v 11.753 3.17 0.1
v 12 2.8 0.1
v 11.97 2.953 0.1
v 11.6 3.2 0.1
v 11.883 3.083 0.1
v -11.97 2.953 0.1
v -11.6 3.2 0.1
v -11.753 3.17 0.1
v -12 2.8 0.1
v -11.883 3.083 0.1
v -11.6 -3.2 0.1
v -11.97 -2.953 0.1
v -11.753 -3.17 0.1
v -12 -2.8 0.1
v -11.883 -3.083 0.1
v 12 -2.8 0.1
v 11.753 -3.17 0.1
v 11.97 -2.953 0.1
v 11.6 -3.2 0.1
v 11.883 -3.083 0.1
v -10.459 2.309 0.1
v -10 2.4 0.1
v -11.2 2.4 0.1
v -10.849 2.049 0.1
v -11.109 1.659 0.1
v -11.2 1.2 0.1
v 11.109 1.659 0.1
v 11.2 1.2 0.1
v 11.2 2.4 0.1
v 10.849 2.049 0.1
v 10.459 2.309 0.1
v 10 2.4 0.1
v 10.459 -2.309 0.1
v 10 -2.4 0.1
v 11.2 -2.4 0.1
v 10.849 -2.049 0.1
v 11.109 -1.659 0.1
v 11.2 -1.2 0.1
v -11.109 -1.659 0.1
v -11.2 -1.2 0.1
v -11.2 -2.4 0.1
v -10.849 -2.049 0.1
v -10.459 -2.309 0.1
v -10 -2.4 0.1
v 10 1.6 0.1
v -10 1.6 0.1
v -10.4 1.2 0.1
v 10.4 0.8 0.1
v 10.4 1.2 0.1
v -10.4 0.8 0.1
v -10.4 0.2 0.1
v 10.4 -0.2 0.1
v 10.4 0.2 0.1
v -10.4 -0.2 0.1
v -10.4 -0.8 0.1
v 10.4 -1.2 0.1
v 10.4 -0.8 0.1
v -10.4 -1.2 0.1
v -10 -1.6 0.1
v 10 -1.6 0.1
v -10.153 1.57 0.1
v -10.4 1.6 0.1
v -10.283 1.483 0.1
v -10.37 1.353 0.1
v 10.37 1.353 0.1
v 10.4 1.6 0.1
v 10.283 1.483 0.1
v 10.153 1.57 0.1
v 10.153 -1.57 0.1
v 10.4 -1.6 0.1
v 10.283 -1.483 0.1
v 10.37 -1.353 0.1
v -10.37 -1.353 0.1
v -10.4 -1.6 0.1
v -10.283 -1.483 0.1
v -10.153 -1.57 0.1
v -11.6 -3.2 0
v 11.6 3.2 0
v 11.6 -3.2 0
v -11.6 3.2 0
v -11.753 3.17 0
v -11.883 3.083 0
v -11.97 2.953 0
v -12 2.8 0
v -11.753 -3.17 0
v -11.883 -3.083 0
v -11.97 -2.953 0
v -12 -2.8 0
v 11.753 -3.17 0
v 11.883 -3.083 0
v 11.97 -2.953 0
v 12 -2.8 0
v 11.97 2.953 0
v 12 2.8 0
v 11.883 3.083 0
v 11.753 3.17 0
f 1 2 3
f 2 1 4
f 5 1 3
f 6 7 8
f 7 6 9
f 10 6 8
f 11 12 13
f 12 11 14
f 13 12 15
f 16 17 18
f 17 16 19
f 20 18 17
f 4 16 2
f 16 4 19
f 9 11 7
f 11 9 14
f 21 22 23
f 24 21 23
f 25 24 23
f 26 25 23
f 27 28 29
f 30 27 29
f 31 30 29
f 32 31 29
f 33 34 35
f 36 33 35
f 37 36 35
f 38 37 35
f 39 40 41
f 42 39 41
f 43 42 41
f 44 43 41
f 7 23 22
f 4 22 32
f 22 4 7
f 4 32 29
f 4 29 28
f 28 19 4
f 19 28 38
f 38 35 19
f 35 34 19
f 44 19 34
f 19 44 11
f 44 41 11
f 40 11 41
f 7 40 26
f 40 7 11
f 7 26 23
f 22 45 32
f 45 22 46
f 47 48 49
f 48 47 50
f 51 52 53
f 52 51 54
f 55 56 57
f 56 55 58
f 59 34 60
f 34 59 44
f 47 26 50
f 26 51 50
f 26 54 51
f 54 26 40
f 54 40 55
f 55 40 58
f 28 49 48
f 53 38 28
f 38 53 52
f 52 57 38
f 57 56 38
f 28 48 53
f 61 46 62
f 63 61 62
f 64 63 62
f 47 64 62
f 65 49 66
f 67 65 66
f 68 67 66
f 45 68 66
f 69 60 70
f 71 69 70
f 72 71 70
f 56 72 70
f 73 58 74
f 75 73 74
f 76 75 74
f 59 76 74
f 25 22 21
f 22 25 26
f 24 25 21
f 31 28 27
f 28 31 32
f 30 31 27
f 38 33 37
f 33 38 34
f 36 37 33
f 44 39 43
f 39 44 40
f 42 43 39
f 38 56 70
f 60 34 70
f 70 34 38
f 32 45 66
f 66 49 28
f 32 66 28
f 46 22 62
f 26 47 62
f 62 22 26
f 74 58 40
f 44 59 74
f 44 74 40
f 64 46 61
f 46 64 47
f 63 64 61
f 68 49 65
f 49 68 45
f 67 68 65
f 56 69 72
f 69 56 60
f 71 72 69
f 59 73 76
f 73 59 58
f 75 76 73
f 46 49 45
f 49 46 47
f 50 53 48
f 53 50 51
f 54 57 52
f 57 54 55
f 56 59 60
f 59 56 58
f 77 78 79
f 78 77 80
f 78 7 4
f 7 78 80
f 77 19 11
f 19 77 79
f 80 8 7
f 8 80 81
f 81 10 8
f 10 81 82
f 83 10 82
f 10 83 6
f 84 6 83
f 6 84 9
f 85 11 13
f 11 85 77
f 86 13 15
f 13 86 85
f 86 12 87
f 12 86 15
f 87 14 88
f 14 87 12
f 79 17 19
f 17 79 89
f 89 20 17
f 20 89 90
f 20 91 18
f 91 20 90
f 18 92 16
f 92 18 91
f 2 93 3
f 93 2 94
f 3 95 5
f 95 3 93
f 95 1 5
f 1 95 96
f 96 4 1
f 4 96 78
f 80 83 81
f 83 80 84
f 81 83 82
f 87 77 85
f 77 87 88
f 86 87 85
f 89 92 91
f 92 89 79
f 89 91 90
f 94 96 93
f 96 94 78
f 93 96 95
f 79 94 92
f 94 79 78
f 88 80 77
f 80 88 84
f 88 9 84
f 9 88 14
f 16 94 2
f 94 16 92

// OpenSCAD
// file: ../p/box3u12.scad
use <../lib.scad>
function ldraw_lib__box3u12() = [
// 0 Box with 3 Parallel Faces without Any Edges
// 0 Name: box3u12.dat
// 0 Author: J.C. Tchang [tchang]
// 0 !LDRAW_ORG Primitive UPDATE 2014-02
// 0 !LICENSE Licensed under CC BY 2.0 and CC BY 4.0 : see CAreadme.txt
// 
// 0 BFC CERTIFY CCW
  [0,"BFC","CERTIFY"],
  [0,"BFC","CCW"],
// 
// 0 !HISTORY 2014-12-23 [PTadmin] Official Update 2014-02
// 
// 
// 4 16 -1 1 1 1 1 1 1 1 -1 -1 1 -1
  [4,16,-1,1,1,1,1,1,1,1,-1,-1,1,-1],
// 4 16 -1 1 1 -1 0 1 1 0 1 1 1 1
  [4,16,-1,1,1,-1,0,1,1,0,1,1,1,1],
// 4 16 1 1 -1 1 0 -1 -1 0 -1 -1 1 -1
  [4,16,1,1,-1,1,0,-1,-1,0,-1,-1,1,-1],
];
makepoly(ldraw_lib__box3u12(), line=0.2);
// file: ../p/1-4cyli.scad
use <../lib.scad>
function ldraw_lib__1_4cyli() = [
// 0 Cylinder 0.25
// 0 Name: 1-4cyli.dat
// 0 Author: James Jessiman
// 0 !LDRAW_ORG Primitive UPDATE 2012-01
// 0 !LICENSE Licensed under CC BY 2.0 and CC BY 4.0 : see CAreadme.txt
// 
// 0 BFC CERTIFY CCW
  [0,"BFC","CERTIFY"],
  [0,"BFC","CCW"],
// 
// 0 !HISTORY 2002-03-23 [sbliss] Added BFC statement.
// 0 !HISTORY 2002-04-25 [PTadmin] Official Update 2002-02
// 0 !HISTORY 2007-06-22 [PTadmin] Header formatted for Contributor Agreement
// 0 !HISTORY 2008-07-01 [PTadmin] Official Update 2008-01
// 0 !HISTORY 2012-02-16 [Philo] Changed to CCW
// 0 !HISTORY 2012-03-30 [PTadmin] Official Update 2012-01
// 
// 
// 4 16 1 1 0 0.9239 1 0.3827 0.9239 0 0.3827 1 0 0
  [4,16,1,1,0,0.9239,1,0.3827,0.9239,0,0.3827,1,0,0],
// 5 24 1 0 0 1 1 0 0.9239 0 0.3827 1 0 -1
  [5,24,1,0,0,1,1,0,0.9239,0,0.3827,1,0,-1],
// 4 16 0.9239 1 0.3827 0.7071 1 0.7071 0.7071 0 0.7071 0.9239 0 0.3827
  [4,16,0.9239,1,0.3827,0.7071,1,0.7071,0.7071,0,0.7071,0.9239,0,0.3827],
// 5 24 0.9239 0 0.3827 0.9239 1 0.3827 0.7071 0 0.7071 1 0 0
  [5,24,0.9239,0,0.3827,0.9239,1,0.3827,0.7071,0,0.7071,1,0,0],
// 4 16 0.7071 1 0.7071 0.3827 1 0.9239 0.3827 0 0.9239 0.7071 0 0.7071
  [4,16,0.7071,1,0.7071,0.3827,1,0.9239,0.3827,0,0.9239,0.7071,0,0.7071],
// 5 24 0.7071 0 0.7071 0.7071 1 0.7071 0.3827 0 0.9239 0.9239 0 0.3827
  [5,24,0.7071,0,0.7071,0.7071,1,0.7071,0.3827,0,0.9239,0.9239,0,0.3827],
// 4 16 0.3827 1 0.9239 0 1 1 0 0 1 0.3827 0 0.9239
  [4,16,0.3827,1,0.9239,0,1,1,0,0,1,0.3827,0,0.9239],
// 5 24 0.3827 0 0.9239 0.3827 1 0.9239 0 0 1 0.7071 0 0.7071
  [5,24,0.3827,0,0.9239,0.3827,1,0.9239,0,0,1,0.7071,0,0.7071],
// 5 24 0 0 1 0 1 1 0.3827 0 0.9239 -1 0 1
  [5,24,0,0,1,0,1,1,0.3827,0,0.9239,-1,0,1],
];
makepoly(ldraw_lib__1_4cyli(), line=0.2);
// file: ../p/1-4ndis.scad
use <../lib.scad>
function ldraw_lib__1_4ndis() = [
// 0 Disc Negative 0.25
// 0 Name: 1-4ndis.dat
// 0 Author: James Jessiman
// 0 !LDRAW_ORG Primitive UPDATE 2012-01
// 0 !LICENSE Licensed under CC BY 2.0 and CC BY 4.0 : see CAreadme.txt
// 
// 0 BFC CERTIFY CCW
  [0,"BFC","CERTIFY"],
  [0,"BFC","CCW"],
// 
// 0 !HISTORY 2002-03-23 [sbliss] Added BFC Statement
// 0 !HISTORY 2002-04-25 [PTadmin] Official Update 2002-02
// 0 !HISTORY 2007-06-22 [PTadmin] Header formatted for Contributor Agreement
// 0 !HISTORY 2008-07-01 [PTadmin] Official Update 2008-01
// 0 !HISTORY 2012-02-16 [Philo] Changed to CCW
// 0 !HISTORY 2012-03-30 [PTadmin] Official Update 2012-01
// 
// 
// 3 16 0.9239 0 0.3827 1 0 0 1 0 1
  [3,16,0.9239,0,0.3827,1,0,0,1,0,1],
// 3 16 0.7071 0 0.7071 0.9239 0 0.3827 1 0 1
  [3,16,0.7071,0,0.7071,0.9239,0,0.3827,1,0,1],
// 3 16 0.3827 0 0.9239 0.7071 0 0.7071 1 0 1
  [3,16,0.3827,0,0.9239,0.7071,0,0.7071,1,0,1],
// 3 16 0 0 1 0.3827 0 0.9239 1 0 1
  [3,16,0,0,1,0.3827,0,0.9239,1,0,1],
];
makepoly(ldraw_lib__1_4ndis(), line=0.2);
// file: ../p/1-4chrd.scad
use <../lib.scad>
function ldraw_lib__1_4chrd() = [
// 0 Chord 0.25
// 0 Name: 1-4chrd.dat
// 0 Author: Tony Hafner [hafhead]
// 0 !LDRAW_ORG Primitive UPDATE 2012-02
// 0 !LICENSE Licensed under CC BY 2.0 and CC BY 4.0 : see CAreadme.txt
// 
// 0 BFC CERTIFY CCW
  [0,"BFC","CERTIFY"],
  [0,"BFC","CCW"],
// 
// 0 !HISTORY 2004-04-22 [PTadmin] Official Update 2004-02
// 0 !HISTORY 2007-10-09 [PTadmin] Header formatted for Contributor Agreement
// 0 !HISTORY 2008-07-01 [PTadmin] Official Update 2008-01
// 0 !HISTORY 2012-08-02 [MMR1988] Re-creation with PrimGen2 and Rectifier
// 0 !HISTORY 2012-08-09 [PTadmin] Official Update 2012-02
// 
// 
// 4 16 0.9239 0 0.3827 0.3827 0 0.9239 0 0 1 1 0 0
  [4,16,0.9239,0,0.3827,0.3827,0,0.9239,0,0,1,1,0,0],
// 3 16 0.7071 0 0.7071 0.3827 0 0.9239 0.9239 0 0.3827
  [3,16,0.7071,0,0.7071,0.3827,0,0.9239,0.9239,0,0.3827],
];
makepoly(ldraw_lib__1_4chrd(), line=0.2);
// file: s/4111899hs02.scad
use <../../lib.scad>
use <../../p/1-4chrd.scad>
use <../../p/1-4cyli.scad>
use <../../p/box3u12.scad>
function ldraw_lib__s__4111899hs02() = [
// 0 ~Sticker  0.8 x  3 without Top Surface
// 0 Name: s\4111899hs02.dat
// 0 Author: Ulrich Röder [UR]
// 0 !LDRAW_ORG Subpart UPDATE 2020-03
// 0 !LICENSE Licensed under CC BY 2.0 and CC BY 4.0 : see CAreadme.txt
// 
// 0 BFC CERTIFY CCW
  [0,"BFC","CERTIFY"],
  [0,"BFC","CCW"],
// 
// 0 !HISTORY 2020-12-29 [PTadmin] Official Update 2020-03
// 
// 
// 1 16 0 -0.25 0 29 0 0 0 0.25 0 0 0 8 box3u12.dat
  [1,16,0,-0.25,0,29,0,0,0,0.25,0,0,0,8, ldraw_lib__box3u12()],
// 1 16 -29 0 7 0 0 -1 0 -.25 0 1 0 0 1-4cyli.dat
  [1,16,-29,0,7,0,0,-1,0,-.25,0,1,0,0, ldraw_lib__1_4cyli()],
// 1 16 -29 0 -7 0 0 -1 0 -.25 0 -1 0 0 1-4cyli.dat
  [1,16,-29,0,-7,0,0,-1,0,-.25,0,-1,0,0, ldraw_lib__1_4cyli()],
// 1 16 29 0 -7 0 0 1 0 -.25 0 -1 0 0 1-4cyli.dat
  [1,16,29,0,-7,0,0,1,0,-.25,0,-1,0,0, ldraw_lib__1_4cyli()],
// 1 16 29 0 7 1 0 0 0 -.25 0 0 0 1 1-4cyli.dat
  [1,16,29,0,7,1,0,0,0,-.25,0,0,0,1, ldraw_lib__1_4cyli()],
// 1 16 -29 0 7 0 0 -1 0 -1 0 1 0 0 1-4chrd.dat
  [1,16,-29,0,7,0,0,-1,0,-1,0,1,0,0, ldraw_lib__1_4chrd()],
// 1 16 -29 0 -7 0 0 -1 0 -1 0 -1 0 0 1-4chrd.dat
  [1,16,-29,0,-7,0,0,-1,0,-1,0,-1,0,0, ldraw_lib__1_4chrd()],
// 1 16 29 0 -7 0 0 1 0 -1 0 -1 0 0 1-4chrd.dat
  [1,16,29,0,-7,0,0,1,0,-1,0,-1,0,0, ldraw_lib__1_4chrd()],
// 1 16 29 0 7 1 0 0 0 -1 0 0 0 1 1-4chrd.dat
  [1,16,29,0,7,1,0,0,0,-1,0,0,0,1, ldraw_lib__1_4chrd()],
// 4 16 29 0 8 30 0 7 30 0 -7 29 0 -8
  [4,16,29,0,8,30,0,7,30,0,-7,29,0,-8],
// 4 16 -29 0 -8 -30 0 -7 -30 0 7 -29 0 8
  [4,16,-29,0,-8,-30,0,-7,-30,0,7,-29,0,8],
// 4 16 -30 -.25 7 -30 0 7 -30 0 -7 -30 -.25 -7
  [4,16,-30,-.25,7,-30,0,7,-30,0,-7,-30,-.25,-7],
// 4 16 30 0 -7 30 0 7 30 -.25 7 30 -.25 -7
  [4,16,30,0,-7,30,0,7,30,-.25,7,30,-.25,-7],
];
makepoly(ldraw_lib__s__4111899hs02(), line=0.2);
// file: s/4111899hs01.scad
use <../../lib.scad>
use <../../p/1-4chrd.scad>
use <../../p/1-4ndis.scad>
function ldraw_lib__s__4111899hs01() = [
// 0 ~Sticker  0.8 x  3 with Black Grille - Background
// 0 Name: s\4111899hs01.dat
// 0 Author: Ulrich Röder [UR]
// 0 !LDRAW_ORG Subpart UPDATE 2020-03
// 0 !LICENSE Licensed under CC BY 2.0 and CC BY 4.0 : see CAreadme.txt
// 
// 0 BFC CERTIFY CCW
  [0,"BFC","CERTIFY"],
  [0,"BFC","CCW"],
// 
// 0 !HISTORY 2020-12-29 [PTadmin] Official Update 2020-03
// 
// 
// 1 16 29 -.25 7 1 0 0 0 1 0 0 0 1 1-4chrd.dat
  [1,16,29,-.25,7,1,0,0,0,1,0,0,0,1, ldraw_lib__1_4chrd()],
// 1 16 -29 -.25 7 0 0 -1 0 1 0 1 0 0 1-4chrd.dat
  [1,16,-29,-.25,7,0,0,-1,0,1,0,1,0,0, ldraw_lib__1_4chrd()],
// 1 16 -29 -.25 -7 0 0 -1 0 1 0 -1 0 0 1-4chrd.dat
  [1,16,-29,-.25,-7,0,0,-1,0,1,0,-1,0,0, ldraw_lib__1_4chrd()],
// 1 16 29 -.25 -7 0 0 1 0 1 0 -1 0 0 1-4chrd.dat
  [1,16,29,-.25,-7,0,0,1,0,1,0,-1,0,0, ldraw_lib__1_4chrd()],
// 4 16 30 -.25 -7 30 -.25 7 29 -.25 8 29 -.25 -8
  [4,16,30,-.25,-7,30,-.25,7,29,-.25,8,29,-.25,-8],
// 4 16 -30 -.25 7 -30 -.25 -7 -29 -.25 -8 -29 -.25 8
  [4,16,-30,-.25,7,-30,-.25,-7,-29,-.25,-8,-29,-.25,8],
// 1 16 -25 -.25 3 0 0 -3 0 1 0 3 0 0 1-4ndis.dat
  [1,16,-25,-.25,3,0,0,-3,0,1,0,3,0,0, ldraw_lib__1_4ndis()],
// 1 16 25 -.25 3 3 0 0 0 1 0 0 0 3 1-4ndis.dat
  [1,16,25,-.25,3,3,0,0,0,1,0,0,0,3, ldraw_lib__1_4ndis()],
// 1 16 25 -.25 -3 0 0 3 0 1 0 -3 0 0 1-4ndis.dat
  [1,16,25,-.25,-3,0,0,3,0,1,0,-3,0,0, ldraw_lib__1_4ndis()],
// 1 16 -25 -.25 -3 -3 0 0 0 1 0 0 0 -3 1-4ndis.dat
  [1,16,-25,-.25,-3,-3,0,0,0,1,0,0,0,-3, ldraw_lib__1_4ndis()],
// 3 16 -29 -.25 8 -28 -.25 6 -25 -.25 6
  [3,16,-29,-.25,8,-28,-.25,6,-25,-.25,6],
// 4 16 25 -.25 6 29 -.25 8 -29 -.25 8 -25 -.25 6
  [4,16,25,-.25,6,29,-.25,8,-29,-.25,8,-25,-.25,6],
// 3 16 29 -.25 8 25 -.25 6 28 -.25 6
  [3,16,29,-.25,8,25,-.25,6,28,-.25,6],
// 3 16 29 -.25 8 28 -.25 6 28 -.25 3
  [3,16,29,-.25,8,28,-.25,6,28,-.25,3],
// 4 16 29 -.25 8 28 -.25 3 28 -.25 -3 29 -.25 -8
  [4,16,29,-.25,8,28,-.25,3,28,-.25,-3,29,-.25,-8],
// 3 16 28 -.25 -3 28 -.25 -6 29 -.25 -8
  [3,16,28,-.25,-3,28,-.25,-6,29,-.25,-8],
// 3 16 28 -.25 -6 25 -.25 -6 29 -.25 -8
  [3,16,28,-.25,-6,25,-.25,-6,29,-.25,-8],
// 4 16 29 -.25 -8 25 -.25 -6 -25 -.25 -6 -29 -.25 -8
  [4,16,29,-.25,-8,25,-.25,-6,-25,-.25,-6,-29,-.25,-8],
// 3 16 -25 -.25 -6 -28 -.25 -6 -29 -.25 -8
  [3,16,-25,-.25,-6,-28,-.25,-6,-29,-.25,-8],
// 3 16 -28 -.25 -3 -29 -.25 -8 -28 -.25 -6
  [3,16,-28,-.25,-3,-29,-.25,-8,-28,-.25,-6],
// 4 16 -29 -.25 -8 -28 -.25 -3 -28 -.25 3 -29 -.25 8
  [4,16,-29,-.25,-8,-28,-.25,-3,-28,-.25,3,-29,-.25,8],
// 3 16 -29 -.25 8 -28 -.25 3 -28 -.25 6
  [3,16,-29,-.25,8,-28,-.25,3,-28,-.25,6],
// 
// 4 0 25 -.25 4 25 -.25 6 -25 -.25 6 -25 -.25 4
  [4,0,25,-.25,4,25,-.25,6,-25,-.25,6,-25,-.25,4],
// 4 0 -26 -.25 2 26 -.25 2 26 -.25 3 -26 -.25 3
  [4,0,-26,-.25,2,26,-.25,2,26,-.25,3,-26,-.25,3],
// 4 0 26 -.25 .5 -26 -.25 .5 -26 -.25 -.5 26 -.25 -.5
  [4,0,26,-.25,.5,-26,-.25,.5,-26,-.25,-.5,26,-.25,-.5],
// 4 0 -26 -.25 -2 -26 -.25 -3 26 -.25 -3 26 -.25 -2
  [4,0,-26,-.25,-2,-26,-.25,-3,26,-.25,-3,26,-.25,-2],
// 4 0 25 -.25 -4 -25 -.25 -4 -25 -.25 -6 25 -.25 -6
  [4,0,25,-.25,-4,-25,-.25,-4,-25,-.25,-6,25,-.25,-6],
// 3 0 -26 -.25 3 -28 -.25 3 -26 -.25 2
  [3,0,-26,-.25,3,-28,-.25,3,-26,-.25,2],
// 3 0 -28 -.25 3 -26 -.25 .5 -26 -.25 2
  [3,0,-28,-.25,3,-26,-.25,.5,-26,-.25,2],
// 4 0 -26 -.25 -.5 -26 -.25 .5 -28 -.25 3 -28 -.25 -3
  [4,0,-26,-.25,-.5,-26,-.25,.5,-28,-.25,3,-28,-.25,-3],
// 3 0 -26 -.25 -.5 -28 -.25 -3 -26 -.25 -2
  [3,0,-26,-.25,-.5,-28,-.25,-3,-26,-.25,-2],
// 3 0 -26 -.25 -2 -28 -.25 -3 -26 -.25 -3
  [3,0,-26,-.25,-2,-28,-.25,-3,-26,-.25,-3],
// 3 0 28 -.25 3 26 -.25 3 26 -.25 2
  [3,0,28,-.25,3,26,-.25,3,26,-.25,2],
// 4 0 28 -.25 3 26 -.25 .5 26 -.25 -.5 28 -.25 -3
  [4,0,28,-.25,3,26,-.25,.5,26,-.25,-.5,28,-.25,-3],
// 3 0 26 -.25 -.5 26 -.25 -2 28 -.25 -3
  [3,0,26,-.25,-.5,26,-.25,-2,28,-.25,-3],
// 3 0 26 -.25 -2 26 -.25 -3 28 -.25 -3
  [3,0,26,-.25,-2,26,-.25,-3,28,-.25,-3],
// 3 0 28 -.25 3 26 -.25 2 26 -.25 .5
  [3,0,28,-.25,3,26,-.25,2,26,-.25,.5],
// 1 0 -25 -.25 3 0 0 -1 0 1 0 1 0 0 1-4ndis.dat
  [1,0,-25,-.25,3,0,0,-1,0,1,0,1,0,0, ldraw_lib__1_4ndis()],
// 1 0 25 -.25 3 1 0 0 0 1 0 0 0 1 1-4ndis.dat
  [1,0,25,-.25,3,1,0,0,0,1,0,0,0,1, ldraw_lib__1_4ndis()],
// 1 0 25 -.25 -3 0 0 1 0 1 0 -1 0 0 1-4ndis.dat
  [1,0,25,-.25,-3,0,0,1,0,1,0,-1,0,0, ldraw_lib__1_4ndis()],
// 1 0 -25 -.25 -3 -1 0 0 0 1 0 0 0 -1 1-4ndis.dat
  [1,0,-25,-.25,-3,-1,0,0,0,1,0,0,0,-1, ldraw_lib__1_4ndis()],
// 1 0 -25 -.25 3 0 0 -3 0 1 0 3 0 0 1-4chrd.dat
  [1,0,-25,-.25,3,0,0,-3,0,1,0,3,0,0, ldraw_lib__1_4chrd()],
// 1 0 25 -.25 3 3 0 0 0 1 0 0 0 3 1-4chrd.dat
  [1,0,25,-.25,3,3,0,0,0,1,0,0,0,3, ldraw_lib__1_4chrd()],
// 1 0 25 -.25 -3 0 0 3 0 1 0 -3 0 0 1-4chrd.dat
  [1,0,25,-.25,-3,0,0,3,0,1,0,-3,0,0, ldraw_lib__1_4chrd()],
// 1 0 -25 -.25 -3 -3 0 0 0 1 0 0 0 -3 1-4chrd.dat
  [1,0,-25,-.25,-3,-3,0,0,0,1,0,0,0,-3, ldraw_lib__1_4chrd()],
// 3 0 28 -.25 -3 26 -.25 -3 26 -.25 -4
  [3,0,28,-.25,-3,26,-.25,-3,26,-.25,-4],
// 3 0 25 -.25 -4 25 -.25 -6 26 -.25 -4
  [3,0,25,-.25,-4,25,-.25,-6,26,-.25,-4],
// 3 0 26 -.25 -4 25 -.25 -6 28 -.25 -3
  [3,0,26,-.25,-4,25,-.25,-6,28,-.25,-3],
// 3 0 25 -.25 6 25 -.25 4 26 -.25 4
  [3,0,25,-.25,6,25,-.25,4,26,-.25,4],
// 3 0 26 -.25 4 26 -.25 3 28 -.25 3
  [3,0,26,-.25,4,26,-.25,3,28,-.25,3],
// 3 0 25 -.25 6 26 -.25 4 28 -.25 3
  [3,0,25,-.25,6,26,-.25,4,28,-.25,3],
// 3 0 -25 -.25 4 -25 -.25 6 -26 -.25 4
  [3,0,-25,-.25,4,-25,-.25,6,-26,-.25,4],
// 3 0 -28 -.25 3 -26 -.25 3 -26 -.25 4
  [3,0,-28,-.25,3,-26,-.25,3,-26,-.25,4],
// 3 0 -26 -.25 4 -25 -.25 6 -28 -.25 3
  [3,0,-26,-.25,4,-25,-.25,6,-28,-.25,3],
// 3 0 -26 -.25 -4 -26 -.25 -3 -28 -.25 -3
  [3,0,-26,-.25,-4,-26,-.25,-3,-28,-.25,-3],
// 3 0 -25 -.25 -6 -25 -.25 -4 -26 -.25 -4
  [3,0,-25,-.25,-6,-25,-.25,-4,-26,-.25,-4],
// 3 0 -25 -.25 -6 -26 -.25 -4 -28 -.25 -3
  [3,0,-25,-.25,-6,-26,-.25,-4,-28,-.25,-3],
// 
// 1 7 -25 -.25 3 0 0 -1 0 1 0 1 0 0 1-4chrd.dat
  [1,7,-25,-.25,3,0,0,-1,0,1,0,1,0,0, ldraw_lib__1_4chrd()],
// 1 7 25 -.25 3 1 0 0 0 1 0 0 0 1 1-4chrd.dat
  [1,7,25,-.25,3,1,0,0,0,1,0,0,0,1, ldraw_lib__1_4chrd()],
// 1 7 25 -.25 -3 0 0 1 0 1 0 -1 0 0 1-4chrd.dat
  [1,7,25,-.25,-3,0,0,1,0,1,0,-1,0,0, ldraw_lib__1_4chrd()],
// 1 7 -25 -.25 -3 -1 0 0 0 1 0 0 0 -1 1-4chrd.dat
  [1,7,-25,-.25,-3,-1,0,0,0,1,0,0,0,-1, ldraw_lib__1_4chrd()],
// 4 7 -25 -.25 4 -26 -.25 3 26 -.25 3 25 -.25 4
  [4,7,-25,-.25,4,-26,-.25,3,26,-.25,3,25,-.25,4],
// 4 7 26 -.25 2 -26 -.25 2 -26 -.25 .5 26 -.25 .5
  [4,7,26,-.25,2,-26,-.25,2,-26,-.25,.5,26,-.25,.5],
// 4 7 26 -.25 -.5 -26 -.25 -.5 -26 -.25 -2 26 -.25 -2
  [4,7,26,-.25,-.5,-26,-.25,-.5,-26,-.25,-2,26,-.25,-2],
// 4 7 -26 -.25 -3 -25 -.25 -4 25 -.25 -4 26 -.25 -3
  [4,7,-26,-.25,-3,-25,-.25,-4,25,-.25,-4,26,-.25,-3],
];
makepoly(ldraw_lib__s__4111899hs01(), line=0.2);
// main file
use <../lib.scad>
use <s/4111899hs01.scad>
use <s/4111899hs02.scad>
function ldraw_lib__4111899h() = [
// 0 Sticker  0.8 x  3 with Black Grille and Yellow Background
// 0 Name: 4111899h.dat
// 0 Author: Ulrich Röder [UR]
// 0 !LDRAW_ORG Part UPDATE 2020-03
// 0 !LICENSE Licensed under CC BY 2.0 and CC BY 4.0 : see CAreadme.txt
// 
// 0 BFC CERTIFY CCW
  [0,"BFC","CERTIFY"],
  [0,"BFC","CCW"],
// 
// 0 !KEYWORDS Black Thunder, helicopter, Set 5542
// 
// 0 !HISTORY 2020-12-29 [PTadmin] Official Update 2020-03
// 
// 
// 1 14 0 0 0 1 0 0 0 1 0 0 0 1 s\4111899hs01.dat
  [1,14,0,0,0,1,0,0,0,1,0,0,0,1, ldraw_lib__s__4111899hs01()],
// 1 16 0 0 0 1 0 0 0 1 0 0 0 1 s\4111899hs02.dat
  [1,16,0,0,0,1,0,0,0,1,0,0,0,1, ldraw_lib__s__4111899hs02()],
];
makepoly(ldraw_lib__4111899h(), line=0.2);
